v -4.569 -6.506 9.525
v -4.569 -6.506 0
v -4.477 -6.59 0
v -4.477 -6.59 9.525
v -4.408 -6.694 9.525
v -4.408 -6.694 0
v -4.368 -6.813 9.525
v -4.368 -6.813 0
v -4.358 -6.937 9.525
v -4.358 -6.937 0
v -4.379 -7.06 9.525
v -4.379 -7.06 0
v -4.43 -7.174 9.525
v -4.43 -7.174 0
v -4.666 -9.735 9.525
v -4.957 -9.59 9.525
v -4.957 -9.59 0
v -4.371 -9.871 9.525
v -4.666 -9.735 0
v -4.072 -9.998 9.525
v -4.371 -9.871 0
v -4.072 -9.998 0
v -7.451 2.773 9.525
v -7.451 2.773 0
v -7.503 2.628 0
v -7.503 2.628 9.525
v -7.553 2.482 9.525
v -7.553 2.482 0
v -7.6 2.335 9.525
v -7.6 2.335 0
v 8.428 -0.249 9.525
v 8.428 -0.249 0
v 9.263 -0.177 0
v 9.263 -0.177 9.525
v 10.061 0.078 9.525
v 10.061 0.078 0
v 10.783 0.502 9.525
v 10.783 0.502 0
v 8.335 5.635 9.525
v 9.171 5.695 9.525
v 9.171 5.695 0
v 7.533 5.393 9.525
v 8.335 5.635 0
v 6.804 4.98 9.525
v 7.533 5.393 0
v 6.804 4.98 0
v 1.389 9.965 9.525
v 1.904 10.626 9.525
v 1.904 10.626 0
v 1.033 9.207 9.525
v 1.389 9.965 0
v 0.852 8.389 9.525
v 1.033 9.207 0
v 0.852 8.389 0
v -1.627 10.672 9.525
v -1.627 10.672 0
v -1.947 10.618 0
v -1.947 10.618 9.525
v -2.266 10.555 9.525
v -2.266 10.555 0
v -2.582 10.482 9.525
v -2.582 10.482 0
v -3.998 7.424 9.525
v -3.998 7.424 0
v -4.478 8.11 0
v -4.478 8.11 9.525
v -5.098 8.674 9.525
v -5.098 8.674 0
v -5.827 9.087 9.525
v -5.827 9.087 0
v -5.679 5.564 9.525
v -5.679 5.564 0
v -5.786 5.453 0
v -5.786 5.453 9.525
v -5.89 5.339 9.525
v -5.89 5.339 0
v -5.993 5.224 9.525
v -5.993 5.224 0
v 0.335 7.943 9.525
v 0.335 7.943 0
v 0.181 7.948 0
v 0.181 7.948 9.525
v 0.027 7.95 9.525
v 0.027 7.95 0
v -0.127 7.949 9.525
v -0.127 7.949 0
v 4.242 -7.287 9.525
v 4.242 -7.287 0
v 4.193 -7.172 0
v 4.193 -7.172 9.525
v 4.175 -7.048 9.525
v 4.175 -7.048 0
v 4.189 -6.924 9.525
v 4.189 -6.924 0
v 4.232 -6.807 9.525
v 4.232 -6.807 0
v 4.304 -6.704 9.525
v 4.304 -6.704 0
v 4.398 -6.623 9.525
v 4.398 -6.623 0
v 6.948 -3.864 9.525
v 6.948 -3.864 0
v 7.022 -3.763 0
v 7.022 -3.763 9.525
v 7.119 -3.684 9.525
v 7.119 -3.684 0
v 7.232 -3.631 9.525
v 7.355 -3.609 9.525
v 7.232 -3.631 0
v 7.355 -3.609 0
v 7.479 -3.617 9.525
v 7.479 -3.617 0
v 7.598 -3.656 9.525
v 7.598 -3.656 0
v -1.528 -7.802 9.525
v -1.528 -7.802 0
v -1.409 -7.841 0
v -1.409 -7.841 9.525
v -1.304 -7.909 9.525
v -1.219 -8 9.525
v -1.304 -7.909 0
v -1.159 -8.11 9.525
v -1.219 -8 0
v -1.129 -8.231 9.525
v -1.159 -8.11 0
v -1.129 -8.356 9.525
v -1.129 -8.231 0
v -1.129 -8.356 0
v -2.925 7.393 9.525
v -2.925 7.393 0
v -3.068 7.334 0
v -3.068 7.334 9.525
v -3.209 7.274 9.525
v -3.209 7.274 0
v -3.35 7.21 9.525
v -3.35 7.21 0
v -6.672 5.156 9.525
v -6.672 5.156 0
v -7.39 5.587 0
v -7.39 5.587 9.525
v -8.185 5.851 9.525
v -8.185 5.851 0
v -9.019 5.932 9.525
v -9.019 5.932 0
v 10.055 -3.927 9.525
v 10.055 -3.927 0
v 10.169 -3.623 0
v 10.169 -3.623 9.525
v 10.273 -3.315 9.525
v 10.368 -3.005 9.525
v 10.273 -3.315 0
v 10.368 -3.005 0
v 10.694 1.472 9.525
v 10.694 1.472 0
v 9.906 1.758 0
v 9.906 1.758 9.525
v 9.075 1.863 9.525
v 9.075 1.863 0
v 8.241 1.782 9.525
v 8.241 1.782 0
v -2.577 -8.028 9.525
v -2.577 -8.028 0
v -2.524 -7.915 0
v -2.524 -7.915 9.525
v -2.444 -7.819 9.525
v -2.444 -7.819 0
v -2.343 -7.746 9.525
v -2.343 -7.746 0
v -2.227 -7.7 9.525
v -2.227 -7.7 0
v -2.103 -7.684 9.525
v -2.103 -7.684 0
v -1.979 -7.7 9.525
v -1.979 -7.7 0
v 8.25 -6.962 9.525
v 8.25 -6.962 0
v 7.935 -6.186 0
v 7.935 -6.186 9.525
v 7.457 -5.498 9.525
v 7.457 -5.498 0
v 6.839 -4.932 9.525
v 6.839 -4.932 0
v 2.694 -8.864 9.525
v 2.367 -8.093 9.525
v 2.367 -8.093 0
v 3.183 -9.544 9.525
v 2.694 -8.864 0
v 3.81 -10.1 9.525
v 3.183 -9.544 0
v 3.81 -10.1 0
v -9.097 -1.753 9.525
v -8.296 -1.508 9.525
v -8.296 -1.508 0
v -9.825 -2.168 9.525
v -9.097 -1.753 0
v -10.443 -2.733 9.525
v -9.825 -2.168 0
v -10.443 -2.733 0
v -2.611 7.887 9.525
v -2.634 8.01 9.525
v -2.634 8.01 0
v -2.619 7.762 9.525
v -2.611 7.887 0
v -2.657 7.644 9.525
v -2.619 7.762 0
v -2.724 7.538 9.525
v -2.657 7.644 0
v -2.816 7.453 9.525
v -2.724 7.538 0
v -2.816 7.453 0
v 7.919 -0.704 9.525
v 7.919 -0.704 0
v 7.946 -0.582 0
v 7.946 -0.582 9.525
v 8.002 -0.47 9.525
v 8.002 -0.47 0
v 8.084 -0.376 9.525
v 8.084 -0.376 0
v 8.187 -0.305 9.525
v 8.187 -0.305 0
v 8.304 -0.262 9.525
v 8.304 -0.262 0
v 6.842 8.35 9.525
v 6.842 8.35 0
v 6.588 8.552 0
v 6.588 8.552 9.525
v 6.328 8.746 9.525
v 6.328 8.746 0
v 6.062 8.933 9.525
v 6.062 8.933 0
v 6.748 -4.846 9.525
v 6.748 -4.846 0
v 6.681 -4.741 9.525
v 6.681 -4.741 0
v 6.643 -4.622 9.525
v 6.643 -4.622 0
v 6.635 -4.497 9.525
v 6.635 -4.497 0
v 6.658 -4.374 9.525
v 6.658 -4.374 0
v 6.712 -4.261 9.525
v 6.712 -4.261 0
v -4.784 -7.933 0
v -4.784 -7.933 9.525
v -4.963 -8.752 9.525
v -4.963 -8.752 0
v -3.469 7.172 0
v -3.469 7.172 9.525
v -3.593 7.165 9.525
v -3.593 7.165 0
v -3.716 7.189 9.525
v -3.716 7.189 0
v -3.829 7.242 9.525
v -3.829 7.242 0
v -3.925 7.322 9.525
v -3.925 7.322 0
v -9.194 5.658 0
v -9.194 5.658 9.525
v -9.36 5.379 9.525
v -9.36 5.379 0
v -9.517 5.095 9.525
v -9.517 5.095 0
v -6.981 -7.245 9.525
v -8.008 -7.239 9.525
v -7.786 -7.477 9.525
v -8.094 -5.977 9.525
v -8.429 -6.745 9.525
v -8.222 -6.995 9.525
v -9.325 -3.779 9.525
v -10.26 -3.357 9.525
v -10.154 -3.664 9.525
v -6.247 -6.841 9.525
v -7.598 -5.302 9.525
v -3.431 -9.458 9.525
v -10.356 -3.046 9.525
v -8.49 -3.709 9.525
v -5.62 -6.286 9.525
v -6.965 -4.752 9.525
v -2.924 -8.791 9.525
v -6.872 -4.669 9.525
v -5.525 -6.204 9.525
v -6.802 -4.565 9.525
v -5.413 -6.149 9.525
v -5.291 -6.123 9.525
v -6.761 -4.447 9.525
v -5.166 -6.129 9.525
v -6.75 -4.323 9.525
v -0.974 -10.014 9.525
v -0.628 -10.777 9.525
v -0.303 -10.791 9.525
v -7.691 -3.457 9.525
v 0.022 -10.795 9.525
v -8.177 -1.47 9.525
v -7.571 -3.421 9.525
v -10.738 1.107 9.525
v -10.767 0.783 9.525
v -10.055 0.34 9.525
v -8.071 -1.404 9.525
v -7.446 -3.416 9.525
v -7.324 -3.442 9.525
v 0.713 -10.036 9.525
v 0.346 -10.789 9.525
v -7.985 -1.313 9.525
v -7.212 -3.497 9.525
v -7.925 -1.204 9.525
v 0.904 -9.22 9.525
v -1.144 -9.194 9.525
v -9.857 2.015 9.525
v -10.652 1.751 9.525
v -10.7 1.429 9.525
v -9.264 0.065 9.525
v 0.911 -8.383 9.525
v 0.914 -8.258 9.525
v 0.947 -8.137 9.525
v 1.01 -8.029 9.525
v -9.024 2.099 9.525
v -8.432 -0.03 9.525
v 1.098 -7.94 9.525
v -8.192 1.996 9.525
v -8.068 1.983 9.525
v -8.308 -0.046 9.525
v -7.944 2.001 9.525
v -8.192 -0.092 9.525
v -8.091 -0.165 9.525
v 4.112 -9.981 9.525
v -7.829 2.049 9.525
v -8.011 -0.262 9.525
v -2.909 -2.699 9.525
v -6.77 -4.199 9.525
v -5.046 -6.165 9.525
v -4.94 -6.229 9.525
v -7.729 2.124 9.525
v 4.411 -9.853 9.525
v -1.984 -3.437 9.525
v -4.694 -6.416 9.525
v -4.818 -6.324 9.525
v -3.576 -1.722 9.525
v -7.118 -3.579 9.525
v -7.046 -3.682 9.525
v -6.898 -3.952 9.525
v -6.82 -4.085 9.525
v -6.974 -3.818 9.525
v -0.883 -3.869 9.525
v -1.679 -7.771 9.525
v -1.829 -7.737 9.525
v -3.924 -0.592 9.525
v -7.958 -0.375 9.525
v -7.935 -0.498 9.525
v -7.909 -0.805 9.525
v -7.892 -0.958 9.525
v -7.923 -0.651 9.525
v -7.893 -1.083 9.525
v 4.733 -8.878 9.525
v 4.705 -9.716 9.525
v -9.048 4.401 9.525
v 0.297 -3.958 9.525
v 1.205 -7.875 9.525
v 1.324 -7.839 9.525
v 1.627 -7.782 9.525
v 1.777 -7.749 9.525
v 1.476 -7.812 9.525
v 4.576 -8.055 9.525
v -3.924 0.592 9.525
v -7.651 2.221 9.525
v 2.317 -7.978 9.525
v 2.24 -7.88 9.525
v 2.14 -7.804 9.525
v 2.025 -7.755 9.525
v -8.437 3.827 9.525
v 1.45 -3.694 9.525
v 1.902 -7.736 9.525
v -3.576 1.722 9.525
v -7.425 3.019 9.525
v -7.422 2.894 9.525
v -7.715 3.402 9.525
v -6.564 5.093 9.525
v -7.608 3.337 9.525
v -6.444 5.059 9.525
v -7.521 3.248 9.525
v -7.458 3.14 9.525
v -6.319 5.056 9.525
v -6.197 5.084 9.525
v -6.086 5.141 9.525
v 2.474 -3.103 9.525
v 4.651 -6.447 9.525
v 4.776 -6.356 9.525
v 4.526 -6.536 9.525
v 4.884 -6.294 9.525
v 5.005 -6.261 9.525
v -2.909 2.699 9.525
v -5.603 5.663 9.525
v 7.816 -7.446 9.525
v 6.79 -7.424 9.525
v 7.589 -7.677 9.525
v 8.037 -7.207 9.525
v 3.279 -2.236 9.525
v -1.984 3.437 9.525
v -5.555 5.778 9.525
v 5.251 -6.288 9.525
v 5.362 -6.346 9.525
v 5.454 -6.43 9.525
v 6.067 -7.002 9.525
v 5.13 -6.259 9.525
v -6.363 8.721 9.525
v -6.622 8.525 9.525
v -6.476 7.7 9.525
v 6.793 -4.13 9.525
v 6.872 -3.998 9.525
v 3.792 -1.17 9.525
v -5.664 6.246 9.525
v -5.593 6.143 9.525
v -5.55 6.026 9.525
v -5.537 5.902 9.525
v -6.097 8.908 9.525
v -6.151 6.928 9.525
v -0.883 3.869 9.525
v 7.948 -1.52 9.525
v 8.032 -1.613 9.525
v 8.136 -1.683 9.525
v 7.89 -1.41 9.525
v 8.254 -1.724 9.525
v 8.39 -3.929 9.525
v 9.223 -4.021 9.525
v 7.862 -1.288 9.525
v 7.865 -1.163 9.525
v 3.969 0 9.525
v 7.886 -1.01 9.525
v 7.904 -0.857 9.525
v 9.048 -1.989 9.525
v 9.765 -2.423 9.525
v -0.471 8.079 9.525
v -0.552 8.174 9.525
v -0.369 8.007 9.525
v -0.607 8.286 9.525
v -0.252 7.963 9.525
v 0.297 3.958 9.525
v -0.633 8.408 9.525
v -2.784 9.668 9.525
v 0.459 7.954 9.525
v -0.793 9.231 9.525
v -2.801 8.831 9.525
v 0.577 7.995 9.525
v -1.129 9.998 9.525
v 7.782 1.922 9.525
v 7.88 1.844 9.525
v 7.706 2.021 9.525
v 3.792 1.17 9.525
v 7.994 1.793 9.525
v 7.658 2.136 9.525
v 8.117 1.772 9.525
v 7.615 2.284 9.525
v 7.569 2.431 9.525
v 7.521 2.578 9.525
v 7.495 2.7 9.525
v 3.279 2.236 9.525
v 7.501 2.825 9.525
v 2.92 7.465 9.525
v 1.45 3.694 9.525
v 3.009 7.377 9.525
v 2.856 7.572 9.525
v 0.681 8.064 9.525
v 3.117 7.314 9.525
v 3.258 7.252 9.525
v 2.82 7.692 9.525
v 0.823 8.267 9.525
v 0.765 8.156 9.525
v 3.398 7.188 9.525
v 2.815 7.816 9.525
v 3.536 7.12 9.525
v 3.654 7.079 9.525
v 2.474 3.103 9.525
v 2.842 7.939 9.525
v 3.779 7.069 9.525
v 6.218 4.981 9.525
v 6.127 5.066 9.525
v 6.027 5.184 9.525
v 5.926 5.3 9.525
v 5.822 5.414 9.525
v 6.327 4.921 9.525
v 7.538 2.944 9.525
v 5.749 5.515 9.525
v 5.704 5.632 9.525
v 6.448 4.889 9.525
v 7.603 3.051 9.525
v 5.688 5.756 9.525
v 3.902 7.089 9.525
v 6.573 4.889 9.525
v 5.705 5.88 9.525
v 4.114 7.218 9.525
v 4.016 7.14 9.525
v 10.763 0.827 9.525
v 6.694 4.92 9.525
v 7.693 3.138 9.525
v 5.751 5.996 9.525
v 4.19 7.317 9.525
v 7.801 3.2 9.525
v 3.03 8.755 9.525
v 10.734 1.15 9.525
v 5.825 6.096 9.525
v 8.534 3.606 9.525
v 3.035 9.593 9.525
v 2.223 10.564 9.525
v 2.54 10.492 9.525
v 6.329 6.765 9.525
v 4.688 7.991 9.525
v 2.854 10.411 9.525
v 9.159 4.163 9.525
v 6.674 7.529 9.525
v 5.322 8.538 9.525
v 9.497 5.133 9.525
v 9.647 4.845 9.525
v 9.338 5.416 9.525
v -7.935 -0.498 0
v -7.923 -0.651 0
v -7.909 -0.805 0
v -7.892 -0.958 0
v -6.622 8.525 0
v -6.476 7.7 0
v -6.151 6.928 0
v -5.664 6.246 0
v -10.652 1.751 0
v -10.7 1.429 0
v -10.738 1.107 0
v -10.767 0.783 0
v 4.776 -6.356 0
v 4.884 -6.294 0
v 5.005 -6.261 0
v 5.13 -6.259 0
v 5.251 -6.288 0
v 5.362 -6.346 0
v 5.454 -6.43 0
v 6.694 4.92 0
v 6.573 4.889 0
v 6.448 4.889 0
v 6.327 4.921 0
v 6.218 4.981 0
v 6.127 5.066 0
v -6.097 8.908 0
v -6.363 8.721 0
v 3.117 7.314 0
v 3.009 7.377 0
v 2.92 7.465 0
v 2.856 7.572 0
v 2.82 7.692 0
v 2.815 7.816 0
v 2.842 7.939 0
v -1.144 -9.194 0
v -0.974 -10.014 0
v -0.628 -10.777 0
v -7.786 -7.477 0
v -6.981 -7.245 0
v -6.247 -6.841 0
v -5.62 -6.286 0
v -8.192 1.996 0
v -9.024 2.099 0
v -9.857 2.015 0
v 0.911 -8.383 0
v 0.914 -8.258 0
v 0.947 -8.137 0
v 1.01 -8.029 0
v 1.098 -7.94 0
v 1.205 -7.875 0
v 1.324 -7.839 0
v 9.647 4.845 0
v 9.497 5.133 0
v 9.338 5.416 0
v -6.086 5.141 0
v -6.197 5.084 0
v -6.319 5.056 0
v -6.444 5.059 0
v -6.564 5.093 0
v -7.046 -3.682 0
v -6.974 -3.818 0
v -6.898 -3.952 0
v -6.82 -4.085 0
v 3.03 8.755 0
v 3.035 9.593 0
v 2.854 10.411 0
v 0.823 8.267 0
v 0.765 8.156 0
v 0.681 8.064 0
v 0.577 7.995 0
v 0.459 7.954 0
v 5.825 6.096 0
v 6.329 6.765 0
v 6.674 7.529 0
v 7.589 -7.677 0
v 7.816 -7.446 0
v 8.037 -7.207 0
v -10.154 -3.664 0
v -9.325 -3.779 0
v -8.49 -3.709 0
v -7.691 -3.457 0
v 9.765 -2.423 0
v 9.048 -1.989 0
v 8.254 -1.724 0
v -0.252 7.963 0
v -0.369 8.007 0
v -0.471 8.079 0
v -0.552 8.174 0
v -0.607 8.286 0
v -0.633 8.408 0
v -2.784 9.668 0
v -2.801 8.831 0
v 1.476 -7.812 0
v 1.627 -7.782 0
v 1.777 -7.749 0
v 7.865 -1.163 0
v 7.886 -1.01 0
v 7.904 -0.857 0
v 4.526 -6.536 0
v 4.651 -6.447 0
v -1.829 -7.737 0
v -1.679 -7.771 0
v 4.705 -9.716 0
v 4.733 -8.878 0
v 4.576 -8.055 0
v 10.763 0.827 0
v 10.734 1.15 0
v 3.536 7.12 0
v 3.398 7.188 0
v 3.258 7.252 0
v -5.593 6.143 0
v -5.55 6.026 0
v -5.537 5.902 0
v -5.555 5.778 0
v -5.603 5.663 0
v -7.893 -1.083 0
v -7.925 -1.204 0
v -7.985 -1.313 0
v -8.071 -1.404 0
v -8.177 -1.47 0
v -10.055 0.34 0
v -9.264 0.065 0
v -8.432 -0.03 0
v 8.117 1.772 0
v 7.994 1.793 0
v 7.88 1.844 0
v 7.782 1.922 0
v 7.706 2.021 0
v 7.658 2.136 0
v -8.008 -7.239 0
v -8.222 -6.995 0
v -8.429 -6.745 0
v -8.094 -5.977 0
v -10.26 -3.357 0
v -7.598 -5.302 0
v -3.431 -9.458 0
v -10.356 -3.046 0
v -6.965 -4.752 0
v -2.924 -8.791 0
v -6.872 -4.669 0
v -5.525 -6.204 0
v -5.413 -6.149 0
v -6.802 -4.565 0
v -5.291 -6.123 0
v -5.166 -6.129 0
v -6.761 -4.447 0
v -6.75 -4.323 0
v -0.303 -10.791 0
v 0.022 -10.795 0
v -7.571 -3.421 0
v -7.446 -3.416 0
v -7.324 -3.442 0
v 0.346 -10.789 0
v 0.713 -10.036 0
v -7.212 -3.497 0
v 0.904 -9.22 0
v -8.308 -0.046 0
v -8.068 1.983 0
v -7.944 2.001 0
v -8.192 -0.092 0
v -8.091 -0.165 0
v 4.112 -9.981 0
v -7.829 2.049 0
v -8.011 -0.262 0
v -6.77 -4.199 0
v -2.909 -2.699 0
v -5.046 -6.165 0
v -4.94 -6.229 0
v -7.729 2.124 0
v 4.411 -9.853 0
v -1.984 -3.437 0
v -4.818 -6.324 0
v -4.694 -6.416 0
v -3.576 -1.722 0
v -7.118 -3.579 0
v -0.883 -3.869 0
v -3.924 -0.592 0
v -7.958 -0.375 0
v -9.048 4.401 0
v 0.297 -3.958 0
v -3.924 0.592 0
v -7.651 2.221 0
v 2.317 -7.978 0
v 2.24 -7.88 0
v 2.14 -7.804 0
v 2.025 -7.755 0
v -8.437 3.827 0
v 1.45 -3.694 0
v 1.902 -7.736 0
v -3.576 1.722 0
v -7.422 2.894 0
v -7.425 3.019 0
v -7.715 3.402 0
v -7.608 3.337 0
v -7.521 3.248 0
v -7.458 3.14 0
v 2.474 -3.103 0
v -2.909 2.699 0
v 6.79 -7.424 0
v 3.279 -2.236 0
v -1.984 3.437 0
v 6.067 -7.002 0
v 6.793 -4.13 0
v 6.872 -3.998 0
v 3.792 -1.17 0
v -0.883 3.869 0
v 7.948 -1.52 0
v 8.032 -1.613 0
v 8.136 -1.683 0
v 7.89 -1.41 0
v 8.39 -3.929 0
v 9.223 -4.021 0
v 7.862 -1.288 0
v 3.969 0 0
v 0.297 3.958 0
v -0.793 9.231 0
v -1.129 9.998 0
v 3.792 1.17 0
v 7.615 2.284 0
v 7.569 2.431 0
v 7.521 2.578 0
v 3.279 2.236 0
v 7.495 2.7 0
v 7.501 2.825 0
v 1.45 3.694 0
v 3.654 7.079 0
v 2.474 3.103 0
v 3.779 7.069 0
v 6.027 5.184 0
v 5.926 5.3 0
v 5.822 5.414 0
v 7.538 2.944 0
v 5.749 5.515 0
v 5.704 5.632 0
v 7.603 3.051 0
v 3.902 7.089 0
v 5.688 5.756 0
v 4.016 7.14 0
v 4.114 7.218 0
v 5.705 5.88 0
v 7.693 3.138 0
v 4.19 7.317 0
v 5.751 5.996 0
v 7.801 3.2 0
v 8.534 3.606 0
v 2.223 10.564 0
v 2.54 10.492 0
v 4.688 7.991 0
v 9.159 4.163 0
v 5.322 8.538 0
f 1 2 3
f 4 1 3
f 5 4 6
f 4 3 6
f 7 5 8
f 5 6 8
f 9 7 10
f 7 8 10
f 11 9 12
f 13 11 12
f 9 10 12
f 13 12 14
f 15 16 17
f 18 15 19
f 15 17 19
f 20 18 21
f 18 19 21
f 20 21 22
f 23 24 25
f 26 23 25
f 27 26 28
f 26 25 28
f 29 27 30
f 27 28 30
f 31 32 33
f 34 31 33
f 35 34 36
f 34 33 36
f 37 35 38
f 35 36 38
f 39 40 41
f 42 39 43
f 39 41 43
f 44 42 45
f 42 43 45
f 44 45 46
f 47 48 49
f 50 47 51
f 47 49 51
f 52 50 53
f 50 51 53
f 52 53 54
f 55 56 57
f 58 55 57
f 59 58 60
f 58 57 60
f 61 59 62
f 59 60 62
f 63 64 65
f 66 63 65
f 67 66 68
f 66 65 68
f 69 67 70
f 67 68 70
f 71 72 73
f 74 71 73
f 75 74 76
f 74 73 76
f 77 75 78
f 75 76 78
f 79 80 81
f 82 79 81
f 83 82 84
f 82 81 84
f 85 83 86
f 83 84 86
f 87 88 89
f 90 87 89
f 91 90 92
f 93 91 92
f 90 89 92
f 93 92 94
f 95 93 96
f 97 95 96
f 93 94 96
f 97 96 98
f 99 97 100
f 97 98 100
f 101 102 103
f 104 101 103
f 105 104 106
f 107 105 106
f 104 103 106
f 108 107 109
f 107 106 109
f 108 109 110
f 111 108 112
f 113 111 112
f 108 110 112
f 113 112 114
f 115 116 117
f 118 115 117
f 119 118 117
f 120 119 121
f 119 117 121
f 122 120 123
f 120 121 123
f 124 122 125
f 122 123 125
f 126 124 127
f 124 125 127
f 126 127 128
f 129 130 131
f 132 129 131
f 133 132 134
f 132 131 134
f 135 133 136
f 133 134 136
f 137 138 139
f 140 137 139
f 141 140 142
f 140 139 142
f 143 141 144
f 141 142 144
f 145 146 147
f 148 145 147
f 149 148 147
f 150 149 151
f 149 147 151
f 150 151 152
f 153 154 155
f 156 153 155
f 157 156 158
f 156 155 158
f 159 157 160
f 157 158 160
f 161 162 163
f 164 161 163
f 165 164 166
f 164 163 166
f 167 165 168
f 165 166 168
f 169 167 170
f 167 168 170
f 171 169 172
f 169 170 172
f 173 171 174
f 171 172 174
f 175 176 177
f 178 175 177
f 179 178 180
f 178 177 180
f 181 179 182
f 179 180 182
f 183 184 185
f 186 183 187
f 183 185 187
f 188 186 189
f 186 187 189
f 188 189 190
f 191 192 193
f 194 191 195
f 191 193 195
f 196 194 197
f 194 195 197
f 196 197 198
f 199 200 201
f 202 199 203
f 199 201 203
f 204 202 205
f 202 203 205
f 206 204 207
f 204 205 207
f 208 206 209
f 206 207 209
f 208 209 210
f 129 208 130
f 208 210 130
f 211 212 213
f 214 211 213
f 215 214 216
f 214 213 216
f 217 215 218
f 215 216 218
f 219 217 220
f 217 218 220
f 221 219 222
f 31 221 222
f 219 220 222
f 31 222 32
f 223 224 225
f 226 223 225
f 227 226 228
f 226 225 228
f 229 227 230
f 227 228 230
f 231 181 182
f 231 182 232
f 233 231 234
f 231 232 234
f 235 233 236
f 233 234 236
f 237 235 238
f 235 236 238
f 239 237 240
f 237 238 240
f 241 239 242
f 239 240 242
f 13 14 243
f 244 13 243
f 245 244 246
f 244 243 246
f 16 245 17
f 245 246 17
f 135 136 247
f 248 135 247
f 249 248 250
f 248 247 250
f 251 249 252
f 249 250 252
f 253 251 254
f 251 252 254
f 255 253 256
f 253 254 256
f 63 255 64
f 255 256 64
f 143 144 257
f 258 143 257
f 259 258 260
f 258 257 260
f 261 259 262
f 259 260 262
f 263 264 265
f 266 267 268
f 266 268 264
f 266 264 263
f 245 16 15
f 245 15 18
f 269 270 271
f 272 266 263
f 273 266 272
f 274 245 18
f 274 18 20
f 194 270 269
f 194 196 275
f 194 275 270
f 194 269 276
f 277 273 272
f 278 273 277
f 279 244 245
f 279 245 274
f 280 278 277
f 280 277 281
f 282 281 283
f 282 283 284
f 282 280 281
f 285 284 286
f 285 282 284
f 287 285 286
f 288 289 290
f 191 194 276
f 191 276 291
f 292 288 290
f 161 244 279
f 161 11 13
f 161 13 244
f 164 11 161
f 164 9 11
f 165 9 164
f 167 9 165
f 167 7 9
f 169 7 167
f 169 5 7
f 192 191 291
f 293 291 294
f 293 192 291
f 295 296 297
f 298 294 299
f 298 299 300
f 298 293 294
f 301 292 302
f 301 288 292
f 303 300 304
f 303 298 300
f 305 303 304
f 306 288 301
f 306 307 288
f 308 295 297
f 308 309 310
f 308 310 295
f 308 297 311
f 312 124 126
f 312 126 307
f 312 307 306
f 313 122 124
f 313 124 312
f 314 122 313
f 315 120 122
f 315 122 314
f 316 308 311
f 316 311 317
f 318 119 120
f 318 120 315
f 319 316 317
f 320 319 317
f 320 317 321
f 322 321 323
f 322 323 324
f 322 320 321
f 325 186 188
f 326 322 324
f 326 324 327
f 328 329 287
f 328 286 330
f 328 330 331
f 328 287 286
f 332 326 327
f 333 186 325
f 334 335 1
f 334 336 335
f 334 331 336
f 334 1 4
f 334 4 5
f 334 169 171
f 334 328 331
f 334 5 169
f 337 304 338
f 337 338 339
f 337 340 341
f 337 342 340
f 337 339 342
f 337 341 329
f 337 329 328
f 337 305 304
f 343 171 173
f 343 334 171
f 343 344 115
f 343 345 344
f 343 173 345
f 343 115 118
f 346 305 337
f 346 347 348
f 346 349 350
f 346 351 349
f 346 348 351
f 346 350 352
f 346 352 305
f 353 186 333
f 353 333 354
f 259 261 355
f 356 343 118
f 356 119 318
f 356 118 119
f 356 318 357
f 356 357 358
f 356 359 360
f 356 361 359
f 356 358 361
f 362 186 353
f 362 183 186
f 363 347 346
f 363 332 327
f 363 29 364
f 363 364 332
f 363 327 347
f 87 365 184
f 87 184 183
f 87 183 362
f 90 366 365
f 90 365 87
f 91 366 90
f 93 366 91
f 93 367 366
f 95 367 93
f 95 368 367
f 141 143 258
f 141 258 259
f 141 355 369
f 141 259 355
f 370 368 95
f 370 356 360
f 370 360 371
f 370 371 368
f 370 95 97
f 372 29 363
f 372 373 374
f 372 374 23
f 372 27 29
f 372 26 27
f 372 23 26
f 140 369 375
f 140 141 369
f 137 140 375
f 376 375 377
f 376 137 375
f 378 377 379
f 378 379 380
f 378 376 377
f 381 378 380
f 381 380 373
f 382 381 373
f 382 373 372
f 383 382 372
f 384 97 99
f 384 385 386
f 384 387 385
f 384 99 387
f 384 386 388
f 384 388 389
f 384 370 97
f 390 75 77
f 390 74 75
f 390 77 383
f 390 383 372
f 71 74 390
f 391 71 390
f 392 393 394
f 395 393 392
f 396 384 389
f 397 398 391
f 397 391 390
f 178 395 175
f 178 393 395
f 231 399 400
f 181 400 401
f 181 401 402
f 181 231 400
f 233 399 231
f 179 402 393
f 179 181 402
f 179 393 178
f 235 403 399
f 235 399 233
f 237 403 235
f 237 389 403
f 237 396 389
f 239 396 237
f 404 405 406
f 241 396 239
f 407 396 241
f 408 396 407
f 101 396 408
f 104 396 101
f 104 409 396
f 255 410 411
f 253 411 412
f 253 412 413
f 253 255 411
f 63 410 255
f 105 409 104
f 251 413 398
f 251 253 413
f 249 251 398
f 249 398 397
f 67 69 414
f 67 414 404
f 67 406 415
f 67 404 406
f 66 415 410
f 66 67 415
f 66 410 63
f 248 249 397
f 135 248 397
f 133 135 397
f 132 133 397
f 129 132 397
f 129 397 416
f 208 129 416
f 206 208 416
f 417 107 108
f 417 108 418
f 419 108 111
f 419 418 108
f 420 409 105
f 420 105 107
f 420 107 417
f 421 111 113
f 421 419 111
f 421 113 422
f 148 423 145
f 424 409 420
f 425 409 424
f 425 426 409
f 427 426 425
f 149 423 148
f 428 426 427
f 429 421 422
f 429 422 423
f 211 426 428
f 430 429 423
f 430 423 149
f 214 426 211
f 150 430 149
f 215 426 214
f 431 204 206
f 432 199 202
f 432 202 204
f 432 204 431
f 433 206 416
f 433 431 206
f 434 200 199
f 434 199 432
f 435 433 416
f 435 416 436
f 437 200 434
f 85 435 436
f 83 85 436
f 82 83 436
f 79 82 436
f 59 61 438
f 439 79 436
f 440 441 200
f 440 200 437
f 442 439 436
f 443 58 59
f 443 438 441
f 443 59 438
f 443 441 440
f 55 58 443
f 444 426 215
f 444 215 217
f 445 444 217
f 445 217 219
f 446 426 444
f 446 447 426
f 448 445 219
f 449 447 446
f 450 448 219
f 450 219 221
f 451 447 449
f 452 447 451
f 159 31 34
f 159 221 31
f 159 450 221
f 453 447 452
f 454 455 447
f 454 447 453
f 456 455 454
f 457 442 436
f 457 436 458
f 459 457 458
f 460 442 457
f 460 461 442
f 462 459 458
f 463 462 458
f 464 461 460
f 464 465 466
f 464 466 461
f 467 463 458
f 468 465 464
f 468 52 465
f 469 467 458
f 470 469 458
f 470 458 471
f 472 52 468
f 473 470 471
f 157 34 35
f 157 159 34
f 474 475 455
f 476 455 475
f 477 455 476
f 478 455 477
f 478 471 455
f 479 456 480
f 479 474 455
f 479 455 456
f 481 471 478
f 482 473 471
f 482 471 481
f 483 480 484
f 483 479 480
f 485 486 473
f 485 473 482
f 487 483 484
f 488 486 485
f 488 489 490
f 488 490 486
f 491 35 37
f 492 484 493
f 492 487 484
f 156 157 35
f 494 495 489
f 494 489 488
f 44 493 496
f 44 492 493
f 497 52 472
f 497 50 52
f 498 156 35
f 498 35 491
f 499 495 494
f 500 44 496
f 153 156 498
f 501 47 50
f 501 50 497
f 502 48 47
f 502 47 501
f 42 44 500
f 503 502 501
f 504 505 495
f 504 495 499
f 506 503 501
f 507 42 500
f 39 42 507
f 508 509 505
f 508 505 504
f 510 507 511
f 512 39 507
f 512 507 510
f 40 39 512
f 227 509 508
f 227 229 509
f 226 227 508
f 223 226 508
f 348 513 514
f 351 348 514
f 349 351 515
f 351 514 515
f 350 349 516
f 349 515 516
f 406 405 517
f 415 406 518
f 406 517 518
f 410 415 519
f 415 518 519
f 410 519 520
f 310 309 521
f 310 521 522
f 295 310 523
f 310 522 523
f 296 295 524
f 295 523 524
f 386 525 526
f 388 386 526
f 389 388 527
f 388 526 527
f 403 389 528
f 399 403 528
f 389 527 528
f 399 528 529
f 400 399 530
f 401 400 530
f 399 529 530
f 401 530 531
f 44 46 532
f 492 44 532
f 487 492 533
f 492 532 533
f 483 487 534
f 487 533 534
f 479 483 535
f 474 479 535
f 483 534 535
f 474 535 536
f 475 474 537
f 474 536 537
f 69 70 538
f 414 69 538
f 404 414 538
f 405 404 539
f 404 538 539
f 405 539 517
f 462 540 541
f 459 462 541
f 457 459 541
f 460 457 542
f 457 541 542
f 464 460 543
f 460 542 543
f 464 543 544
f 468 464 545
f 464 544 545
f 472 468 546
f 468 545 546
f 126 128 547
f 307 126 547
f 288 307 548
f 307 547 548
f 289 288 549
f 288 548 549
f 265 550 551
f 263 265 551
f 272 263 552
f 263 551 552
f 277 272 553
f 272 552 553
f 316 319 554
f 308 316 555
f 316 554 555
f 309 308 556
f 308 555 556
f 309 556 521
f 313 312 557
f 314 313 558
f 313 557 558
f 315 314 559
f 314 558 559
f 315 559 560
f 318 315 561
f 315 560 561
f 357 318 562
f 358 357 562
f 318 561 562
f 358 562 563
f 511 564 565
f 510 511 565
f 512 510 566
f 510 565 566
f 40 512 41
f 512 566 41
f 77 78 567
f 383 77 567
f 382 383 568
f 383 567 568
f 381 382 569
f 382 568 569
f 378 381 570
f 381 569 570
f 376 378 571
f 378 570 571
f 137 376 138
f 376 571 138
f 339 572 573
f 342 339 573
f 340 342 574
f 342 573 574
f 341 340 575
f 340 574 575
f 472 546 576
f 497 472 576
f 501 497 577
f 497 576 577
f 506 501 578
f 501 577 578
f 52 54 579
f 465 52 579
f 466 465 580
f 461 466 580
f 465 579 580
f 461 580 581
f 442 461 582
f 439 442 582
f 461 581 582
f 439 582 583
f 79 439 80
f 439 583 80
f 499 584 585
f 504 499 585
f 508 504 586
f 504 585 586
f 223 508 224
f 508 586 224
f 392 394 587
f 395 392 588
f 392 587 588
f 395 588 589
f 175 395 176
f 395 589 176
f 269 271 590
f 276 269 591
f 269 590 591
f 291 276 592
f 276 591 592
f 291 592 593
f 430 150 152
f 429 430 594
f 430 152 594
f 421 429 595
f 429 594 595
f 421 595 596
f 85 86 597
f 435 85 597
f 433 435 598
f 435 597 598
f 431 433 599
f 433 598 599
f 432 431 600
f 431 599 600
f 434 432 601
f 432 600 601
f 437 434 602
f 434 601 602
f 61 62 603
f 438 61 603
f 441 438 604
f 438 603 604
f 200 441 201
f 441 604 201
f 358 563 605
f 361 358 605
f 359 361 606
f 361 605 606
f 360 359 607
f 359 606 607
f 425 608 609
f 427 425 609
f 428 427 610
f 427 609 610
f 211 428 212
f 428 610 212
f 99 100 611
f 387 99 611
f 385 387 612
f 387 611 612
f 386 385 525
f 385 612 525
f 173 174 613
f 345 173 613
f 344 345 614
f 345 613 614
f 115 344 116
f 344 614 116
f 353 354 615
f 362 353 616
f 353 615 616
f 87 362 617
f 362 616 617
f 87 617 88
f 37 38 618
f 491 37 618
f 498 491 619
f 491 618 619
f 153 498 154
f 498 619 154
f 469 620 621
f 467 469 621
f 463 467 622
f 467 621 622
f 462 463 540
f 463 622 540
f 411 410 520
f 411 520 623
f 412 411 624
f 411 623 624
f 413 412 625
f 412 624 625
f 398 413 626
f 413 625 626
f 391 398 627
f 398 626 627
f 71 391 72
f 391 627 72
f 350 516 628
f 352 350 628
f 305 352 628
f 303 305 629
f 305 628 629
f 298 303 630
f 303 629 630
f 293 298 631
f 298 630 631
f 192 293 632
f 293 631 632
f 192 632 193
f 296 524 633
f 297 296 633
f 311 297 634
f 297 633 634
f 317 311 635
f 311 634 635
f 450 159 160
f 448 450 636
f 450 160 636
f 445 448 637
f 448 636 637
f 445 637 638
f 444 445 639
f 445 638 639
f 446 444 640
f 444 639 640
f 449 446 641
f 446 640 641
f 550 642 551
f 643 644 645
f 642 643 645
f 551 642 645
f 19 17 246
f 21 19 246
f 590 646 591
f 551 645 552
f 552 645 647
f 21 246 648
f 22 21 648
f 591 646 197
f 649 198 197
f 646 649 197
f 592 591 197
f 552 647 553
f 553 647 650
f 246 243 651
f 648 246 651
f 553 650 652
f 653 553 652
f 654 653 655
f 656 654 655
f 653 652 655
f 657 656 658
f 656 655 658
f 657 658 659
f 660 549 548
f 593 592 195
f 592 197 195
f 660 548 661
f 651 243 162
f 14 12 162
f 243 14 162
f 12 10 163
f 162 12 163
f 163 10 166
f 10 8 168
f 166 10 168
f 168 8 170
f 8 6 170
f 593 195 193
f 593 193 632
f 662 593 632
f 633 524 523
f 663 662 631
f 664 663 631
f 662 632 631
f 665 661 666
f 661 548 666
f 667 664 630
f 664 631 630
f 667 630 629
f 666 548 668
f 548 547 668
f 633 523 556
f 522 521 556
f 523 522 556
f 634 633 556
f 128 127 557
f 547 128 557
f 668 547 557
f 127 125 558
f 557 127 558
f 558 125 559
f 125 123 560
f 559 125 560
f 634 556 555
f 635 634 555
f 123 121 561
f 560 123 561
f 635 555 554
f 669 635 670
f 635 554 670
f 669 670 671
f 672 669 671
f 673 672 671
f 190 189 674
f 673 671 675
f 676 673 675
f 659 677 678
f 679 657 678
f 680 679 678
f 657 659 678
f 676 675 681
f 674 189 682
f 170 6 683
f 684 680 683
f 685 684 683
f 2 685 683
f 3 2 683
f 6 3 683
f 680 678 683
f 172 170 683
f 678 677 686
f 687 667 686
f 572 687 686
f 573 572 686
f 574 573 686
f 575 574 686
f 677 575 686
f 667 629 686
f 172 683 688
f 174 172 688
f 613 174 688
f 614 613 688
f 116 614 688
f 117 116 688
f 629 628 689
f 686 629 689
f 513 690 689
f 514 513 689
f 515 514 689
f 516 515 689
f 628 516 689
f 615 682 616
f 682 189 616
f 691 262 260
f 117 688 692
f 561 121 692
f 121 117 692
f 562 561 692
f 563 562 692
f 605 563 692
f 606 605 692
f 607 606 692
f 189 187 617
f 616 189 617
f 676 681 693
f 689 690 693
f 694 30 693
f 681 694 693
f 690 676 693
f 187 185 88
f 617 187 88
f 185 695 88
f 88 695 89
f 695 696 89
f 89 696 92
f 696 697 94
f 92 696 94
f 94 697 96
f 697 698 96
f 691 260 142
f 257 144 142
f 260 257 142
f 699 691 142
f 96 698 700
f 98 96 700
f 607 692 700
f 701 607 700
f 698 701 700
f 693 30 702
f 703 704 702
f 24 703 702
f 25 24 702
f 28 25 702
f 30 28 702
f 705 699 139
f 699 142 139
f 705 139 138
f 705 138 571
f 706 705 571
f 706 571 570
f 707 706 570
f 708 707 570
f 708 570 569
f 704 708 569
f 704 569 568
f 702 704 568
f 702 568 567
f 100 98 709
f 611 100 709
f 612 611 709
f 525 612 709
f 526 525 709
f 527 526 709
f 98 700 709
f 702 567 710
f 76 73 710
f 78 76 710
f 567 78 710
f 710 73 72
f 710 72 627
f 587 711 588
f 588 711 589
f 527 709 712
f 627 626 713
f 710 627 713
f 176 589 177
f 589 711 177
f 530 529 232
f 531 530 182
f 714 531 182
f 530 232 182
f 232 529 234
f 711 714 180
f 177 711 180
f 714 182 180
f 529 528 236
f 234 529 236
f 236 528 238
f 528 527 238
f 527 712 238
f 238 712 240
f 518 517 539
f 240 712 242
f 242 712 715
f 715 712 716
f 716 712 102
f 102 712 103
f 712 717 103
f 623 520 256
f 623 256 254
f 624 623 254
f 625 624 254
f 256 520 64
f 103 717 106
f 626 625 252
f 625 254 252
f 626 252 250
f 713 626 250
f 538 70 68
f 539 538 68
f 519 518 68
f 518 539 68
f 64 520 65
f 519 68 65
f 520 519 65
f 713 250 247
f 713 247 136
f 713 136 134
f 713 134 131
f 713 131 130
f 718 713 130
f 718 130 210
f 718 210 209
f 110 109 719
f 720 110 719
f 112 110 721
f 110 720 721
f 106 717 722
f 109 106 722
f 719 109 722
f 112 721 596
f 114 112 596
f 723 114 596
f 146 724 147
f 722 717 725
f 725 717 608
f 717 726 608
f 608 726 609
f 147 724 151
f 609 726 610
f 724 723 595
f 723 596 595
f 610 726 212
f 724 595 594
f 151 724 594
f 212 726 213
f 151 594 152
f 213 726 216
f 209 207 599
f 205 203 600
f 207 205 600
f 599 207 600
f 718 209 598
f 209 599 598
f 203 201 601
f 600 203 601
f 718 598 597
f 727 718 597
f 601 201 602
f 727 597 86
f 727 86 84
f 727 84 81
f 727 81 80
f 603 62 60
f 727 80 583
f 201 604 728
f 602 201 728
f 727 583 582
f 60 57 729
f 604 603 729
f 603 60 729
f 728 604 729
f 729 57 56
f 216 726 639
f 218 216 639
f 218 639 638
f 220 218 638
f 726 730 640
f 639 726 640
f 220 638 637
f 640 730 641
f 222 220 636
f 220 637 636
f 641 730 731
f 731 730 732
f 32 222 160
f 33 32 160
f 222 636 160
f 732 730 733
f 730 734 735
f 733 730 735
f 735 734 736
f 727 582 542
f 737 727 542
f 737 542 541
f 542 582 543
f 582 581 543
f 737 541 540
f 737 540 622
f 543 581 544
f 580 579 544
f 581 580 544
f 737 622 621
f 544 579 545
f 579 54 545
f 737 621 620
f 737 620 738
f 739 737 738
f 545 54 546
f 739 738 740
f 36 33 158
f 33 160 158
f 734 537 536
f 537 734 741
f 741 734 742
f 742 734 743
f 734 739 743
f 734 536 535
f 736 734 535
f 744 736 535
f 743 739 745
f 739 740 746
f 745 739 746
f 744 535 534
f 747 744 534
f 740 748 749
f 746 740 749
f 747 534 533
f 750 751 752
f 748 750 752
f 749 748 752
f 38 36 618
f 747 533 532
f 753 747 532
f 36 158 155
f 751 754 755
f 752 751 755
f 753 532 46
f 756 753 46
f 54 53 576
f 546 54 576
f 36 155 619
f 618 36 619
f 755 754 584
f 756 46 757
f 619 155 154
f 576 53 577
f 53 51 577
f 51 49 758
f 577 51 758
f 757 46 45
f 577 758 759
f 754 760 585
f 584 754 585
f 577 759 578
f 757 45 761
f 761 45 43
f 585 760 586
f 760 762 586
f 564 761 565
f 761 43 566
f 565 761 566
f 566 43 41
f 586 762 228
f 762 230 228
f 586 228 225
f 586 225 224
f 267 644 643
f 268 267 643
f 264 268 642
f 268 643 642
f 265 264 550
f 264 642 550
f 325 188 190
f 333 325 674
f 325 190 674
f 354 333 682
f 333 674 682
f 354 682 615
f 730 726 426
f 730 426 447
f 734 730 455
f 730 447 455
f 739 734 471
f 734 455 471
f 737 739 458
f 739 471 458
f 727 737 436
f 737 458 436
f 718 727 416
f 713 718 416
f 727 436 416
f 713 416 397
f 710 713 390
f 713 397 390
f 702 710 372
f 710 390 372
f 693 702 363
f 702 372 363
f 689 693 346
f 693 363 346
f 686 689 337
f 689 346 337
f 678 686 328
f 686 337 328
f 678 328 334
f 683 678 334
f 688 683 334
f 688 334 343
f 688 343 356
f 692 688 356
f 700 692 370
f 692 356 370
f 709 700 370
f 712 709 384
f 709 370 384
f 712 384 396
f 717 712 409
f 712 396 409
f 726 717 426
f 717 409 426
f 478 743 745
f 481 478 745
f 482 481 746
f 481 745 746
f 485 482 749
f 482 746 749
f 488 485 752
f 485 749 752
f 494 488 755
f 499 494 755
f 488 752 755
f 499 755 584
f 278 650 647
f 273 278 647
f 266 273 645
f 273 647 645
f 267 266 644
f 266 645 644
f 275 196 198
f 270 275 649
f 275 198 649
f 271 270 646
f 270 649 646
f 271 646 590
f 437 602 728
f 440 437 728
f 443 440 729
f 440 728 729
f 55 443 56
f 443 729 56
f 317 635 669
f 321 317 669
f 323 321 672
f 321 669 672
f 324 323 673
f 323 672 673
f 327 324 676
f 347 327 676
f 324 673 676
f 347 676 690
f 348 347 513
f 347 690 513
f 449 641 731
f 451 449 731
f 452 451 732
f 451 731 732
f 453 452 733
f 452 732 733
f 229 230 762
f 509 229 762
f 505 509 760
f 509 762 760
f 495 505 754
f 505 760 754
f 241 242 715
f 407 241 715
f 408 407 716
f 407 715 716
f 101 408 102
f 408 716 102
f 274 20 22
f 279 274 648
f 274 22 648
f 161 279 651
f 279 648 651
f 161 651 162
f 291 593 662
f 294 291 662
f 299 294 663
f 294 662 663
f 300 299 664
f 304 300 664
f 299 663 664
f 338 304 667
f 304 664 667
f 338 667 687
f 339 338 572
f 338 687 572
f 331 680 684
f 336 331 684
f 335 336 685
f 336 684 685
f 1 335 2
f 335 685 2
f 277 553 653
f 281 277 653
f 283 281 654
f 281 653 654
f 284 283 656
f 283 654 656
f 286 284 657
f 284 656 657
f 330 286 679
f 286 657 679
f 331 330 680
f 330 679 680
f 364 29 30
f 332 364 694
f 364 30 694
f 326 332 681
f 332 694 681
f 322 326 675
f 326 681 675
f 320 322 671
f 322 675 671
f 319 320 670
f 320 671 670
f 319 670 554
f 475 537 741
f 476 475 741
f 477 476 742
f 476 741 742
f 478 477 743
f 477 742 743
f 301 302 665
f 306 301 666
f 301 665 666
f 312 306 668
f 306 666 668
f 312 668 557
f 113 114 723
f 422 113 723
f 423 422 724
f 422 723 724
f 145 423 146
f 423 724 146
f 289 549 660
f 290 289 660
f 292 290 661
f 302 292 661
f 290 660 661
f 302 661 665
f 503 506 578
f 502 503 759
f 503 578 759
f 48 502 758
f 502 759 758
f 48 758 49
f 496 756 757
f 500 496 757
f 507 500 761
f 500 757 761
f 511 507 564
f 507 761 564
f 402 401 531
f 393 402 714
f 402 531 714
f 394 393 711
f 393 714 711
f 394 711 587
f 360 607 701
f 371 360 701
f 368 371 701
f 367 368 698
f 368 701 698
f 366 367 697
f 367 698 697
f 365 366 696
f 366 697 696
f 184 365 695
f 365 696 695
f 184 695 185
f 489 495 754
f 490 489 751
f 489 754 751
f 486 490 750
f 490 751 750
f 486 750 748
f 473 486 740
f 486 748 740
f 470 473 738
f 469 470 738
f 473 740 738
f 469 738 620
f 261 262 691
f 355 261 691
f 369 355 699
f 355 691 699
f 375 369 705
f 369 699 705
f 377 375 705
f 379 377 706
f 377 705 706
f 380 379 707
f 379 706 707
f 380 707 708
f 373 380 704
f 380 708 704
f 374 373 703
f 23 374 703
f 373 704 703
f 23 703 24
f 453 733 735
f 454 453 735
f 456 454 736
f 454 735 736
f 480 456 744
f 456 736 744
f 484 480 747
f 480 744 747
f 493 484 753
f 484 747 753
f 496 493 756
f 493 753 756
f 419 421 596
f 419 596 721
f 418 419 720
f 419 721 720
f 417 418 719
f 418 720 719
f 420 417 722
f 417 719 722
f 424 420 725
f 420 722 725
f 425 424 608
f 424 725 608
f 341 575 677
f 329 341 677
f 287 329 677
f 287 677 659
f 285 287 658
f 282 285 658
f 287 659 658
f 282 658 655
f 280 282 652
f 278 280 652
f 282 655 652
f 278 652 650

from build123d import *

# Parameters (mm, degrees)
SKETCH3_R         = 10.795
GEARBODY_DEPTH    = 9.525
TOOTHCUT_DEPTH    = 10.525
CIRPATTERN1_COUNT = 15
BOREDIA_R         = 3.96875
BORE_DEPTH        = 12700


with BuildPart() as part:
    # Sketch3 → gearBody (new body)
    with BuildSketch(Plane.XY):
        Circle(SKETCH3_R)
    extrude(amount=GEARBODY_DEPTH)

    # Sketch2 → toothCut (cut, through all)
    with BuildSketch(Plane.XY):
        with BuildLine():
            ThreePointArc((7.864672513, -1.163016041), (7.895149368, -0.933968145), (7.918956949, -0.704131297))
            ThreePointArc((7.918956949, -0.704131297), (8.083653363, -0.376064465), (8.4281848, -0.249372536))
            ThreePointArc((8.4281848, -0.249372536), (10.244786828, 0.166211992), (11.641974978, 1.399345683))
            ThreePointArc((11.641974978, 1.399345683), (11.644578548, -1.377512307), (10.99412895, -4.077116426))
            ThreePointArc((10.99412895, -4.077116426), (9.923230012, -2.552016793), (8.253736923, -1.724039588))
            ThreePointArc((8.253736923, -1.724039588), (7.948275924, -1.520455861), (7.864672513, -1.163016041))
        make_face()
    toothcut = extrude(amount=TOOTHCUT_DEPTH, mode=Mode.SUBTRACT)

    # CirPattern1: toothCut ×15 about axis
    cirpattern1_axis = Axis((0, 0, 0), (0, 0, 1))
    for i in range(1, CIRPATTERN1_COUNT):
        add(toothcut.rotate(cirpattern1_axis, i * 360 / CIRPATTERN1_COUNT), mode=Mode.SUBTRACT)

    # boreDia → bore (cut, symmetric)
    with BuildSketch(Plane.XY):
        Circle(BOREDIA_R)
    extrude(amount=BORE_DEPTH, both=True, mode=Mode.SUBTRACT)


solid = part.part
